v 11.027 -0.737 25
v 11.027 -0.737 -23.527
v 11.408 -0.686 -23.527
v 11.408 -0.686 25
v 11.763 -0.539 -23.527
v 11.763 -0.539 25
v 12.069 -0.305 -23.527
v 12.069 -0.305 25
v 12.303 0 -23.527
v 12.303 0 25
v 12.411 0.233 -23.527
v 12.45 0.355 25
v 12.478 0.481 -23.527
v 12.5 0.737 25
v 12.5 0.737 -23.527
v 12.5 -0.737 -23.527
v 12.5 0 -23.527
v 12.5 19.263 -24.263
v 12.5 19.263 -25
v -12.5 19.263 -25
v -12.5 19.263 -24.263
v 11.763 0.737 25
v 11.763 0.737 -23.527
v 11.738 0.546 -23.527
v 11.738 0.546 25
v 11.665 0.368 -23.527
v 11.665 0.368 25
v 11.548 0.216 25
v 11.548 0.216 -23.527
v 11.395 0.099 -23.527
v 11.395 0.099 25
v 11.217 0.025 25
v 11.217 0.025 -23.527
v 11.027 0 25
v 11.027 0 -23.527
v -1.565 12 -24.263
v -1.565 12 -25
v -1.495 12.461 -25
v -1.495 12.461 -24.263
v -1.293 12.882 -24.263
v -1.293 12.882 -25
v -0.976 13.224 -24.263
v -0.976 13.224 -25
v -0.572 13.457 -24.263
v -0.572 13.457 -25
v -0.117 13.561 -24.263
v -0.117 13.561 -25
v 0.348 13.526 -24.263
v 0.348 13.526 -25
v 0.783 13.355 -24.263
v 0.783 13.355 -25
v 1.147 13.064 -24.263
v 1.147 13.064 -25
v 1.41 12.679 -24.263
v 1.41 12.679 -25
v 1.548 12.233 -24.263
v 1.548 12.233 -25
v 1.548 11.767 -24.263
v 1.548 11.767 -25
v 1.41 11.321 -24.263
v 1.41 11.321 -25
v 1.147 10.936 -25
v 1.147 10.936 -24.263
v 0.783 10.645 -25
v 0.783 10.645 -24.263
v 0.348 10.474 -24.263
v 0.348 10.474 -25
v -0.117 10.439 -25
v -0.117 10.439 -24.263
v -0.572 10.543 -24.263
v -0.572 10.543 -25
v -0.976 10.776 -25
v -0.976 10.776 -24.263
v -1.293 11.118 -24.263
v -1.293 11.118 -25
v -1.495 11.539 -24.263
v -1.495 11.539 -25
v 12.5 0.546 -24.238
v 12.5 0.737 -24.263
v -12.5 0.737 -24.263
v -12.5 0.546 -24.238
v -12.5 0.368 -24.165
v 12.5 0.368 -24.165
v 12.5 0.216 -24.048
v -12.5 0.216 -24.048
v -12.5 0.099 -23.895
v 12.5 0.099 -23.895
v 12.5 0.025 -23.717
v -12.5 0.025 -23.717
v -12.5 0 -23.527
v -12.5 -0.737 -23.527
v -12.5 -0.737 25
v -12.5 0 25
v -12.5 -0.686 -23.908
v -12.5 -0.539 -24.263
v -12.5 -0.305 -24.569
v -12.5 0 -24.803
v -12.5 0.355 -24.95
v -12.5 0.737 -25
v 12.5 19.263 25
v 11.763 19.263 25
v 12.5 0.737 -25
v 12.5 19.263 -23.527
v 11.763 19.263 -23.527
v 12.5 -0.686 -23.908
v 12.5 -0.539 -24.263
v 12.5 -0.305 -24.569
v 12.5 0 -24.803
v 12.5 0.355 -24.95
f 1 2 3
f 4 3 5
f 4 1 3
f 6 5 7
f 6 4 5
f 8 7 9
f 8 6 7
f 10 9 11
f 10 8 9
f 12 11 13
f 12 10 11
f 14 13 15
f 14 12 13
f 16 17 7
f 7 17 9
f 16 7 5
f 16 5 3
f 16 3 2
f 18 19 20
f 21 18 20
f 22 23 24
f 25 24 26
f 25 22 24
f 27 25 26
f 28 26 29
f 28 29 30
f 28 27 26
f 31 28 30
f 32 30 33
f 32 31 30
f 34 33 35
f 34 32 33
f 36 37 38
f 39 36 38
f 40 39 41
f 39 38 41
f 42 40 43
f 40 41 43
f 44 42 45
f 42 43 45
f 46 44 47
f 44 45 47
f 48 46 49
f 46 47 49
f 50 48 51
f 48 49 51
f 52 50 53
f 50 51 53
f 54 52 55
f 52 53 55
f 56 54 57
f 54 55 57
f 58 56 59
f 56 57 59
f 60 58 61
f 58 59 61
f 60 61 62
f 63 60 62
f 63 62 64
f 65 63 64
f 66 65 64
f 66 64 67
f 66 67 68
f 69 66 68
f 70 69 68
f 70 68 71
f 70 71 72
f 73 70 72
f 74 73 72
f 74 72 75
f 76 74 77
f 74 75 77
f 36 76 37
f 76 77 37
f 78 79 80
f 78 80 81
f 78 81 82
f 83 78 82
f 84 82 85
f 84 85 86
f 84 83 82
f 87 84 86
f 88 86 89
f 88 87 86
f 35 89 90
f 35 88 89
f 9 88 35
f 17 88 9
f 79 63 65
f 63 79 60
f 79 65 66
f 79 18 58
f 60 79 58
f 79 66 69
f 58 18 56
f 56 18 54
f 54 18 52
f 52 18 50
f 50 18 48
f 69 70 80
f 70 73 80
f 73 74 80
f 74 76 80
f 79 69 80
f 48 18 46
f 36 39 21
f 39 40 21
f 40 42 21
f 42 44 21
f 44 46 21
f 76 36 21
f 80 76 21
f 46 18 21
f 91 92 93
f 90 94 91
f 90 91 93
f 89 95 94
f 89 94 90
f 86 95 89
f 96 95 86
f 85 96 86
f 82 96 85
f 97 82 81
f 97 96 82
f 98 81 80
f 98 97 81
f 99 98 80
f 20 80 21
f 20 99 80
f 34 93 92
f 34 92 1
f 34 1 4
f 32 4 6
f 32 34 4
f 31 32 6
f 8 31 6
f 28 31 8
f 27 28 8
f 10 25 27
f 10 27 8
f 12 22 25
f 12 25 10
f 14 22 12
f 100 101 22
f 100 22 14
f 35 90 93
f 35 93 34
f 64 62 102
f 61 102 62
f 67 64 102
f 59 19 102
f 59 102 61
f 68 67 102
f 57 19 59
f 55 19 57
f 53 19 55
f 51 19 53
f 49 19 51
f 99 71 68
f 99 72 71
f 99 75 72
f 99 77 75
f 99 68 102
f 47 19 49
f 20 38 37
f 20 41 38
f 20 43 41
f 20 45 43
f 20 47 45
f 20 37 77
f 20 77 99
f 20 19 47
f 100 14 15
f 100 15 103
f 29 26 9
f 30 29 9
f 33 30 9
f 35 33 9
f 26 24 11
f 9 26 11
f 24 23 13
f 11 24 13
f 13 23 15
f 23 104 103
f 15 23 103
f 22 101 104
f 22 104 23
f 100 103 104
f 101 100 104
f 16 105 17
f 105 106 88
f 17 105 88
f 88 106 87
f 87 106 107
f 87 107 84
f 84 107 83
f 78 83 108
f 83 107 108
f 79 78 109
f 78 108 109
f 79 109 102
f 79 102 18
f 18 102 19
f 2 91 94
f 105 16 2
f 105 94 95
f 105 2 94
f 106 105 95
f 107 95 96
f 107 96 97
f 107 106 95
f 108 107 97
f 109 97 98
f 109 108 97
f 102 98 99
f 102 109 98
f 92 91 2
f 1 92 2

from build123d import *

# Parameters (mm, degrees)
SKETCH1_W                    = 25
SKETCH1_H                    = 50
BASE_FLANGE1_DEPTH           = 0.7366
EDGE_FLANGE1_STRIP_W         = 4.4196
EDGE_FLANGE1_STRIP_H         = 0.7366
EDGE_FLANGE1_STRIP_CUT_DEPTH = 25
EDGE_FLANGE1_DEPTH           = 25
EDGE_FLANGE1_PROFILE_W       = 25
EDGE_FLANGE1_PROFILE_H       = 18.5268
EDGE_FLANGE1_PROFILE_R       = 1.565
EDGE_FLANGE1_FLAT_DEPTH      = 0.7366
EDGE_FLANGE3_STRIP_W         = 4.4196
EDGE_FLANGE3_STRIP_H         = 0.7366
EDGE_FLANGE3_STRIP_CUT_DEPTH = 48.5268
EDGE_FLANGE3_DEPTH           = 48.5268


# Sheet-metal steps are written as plain solids
with BuildPart() as part:
    # Sketch1 → Base-Flange1 (new body)
    with BuildSketch(Plane(origin=(0, 0, 0), x_dir=(1, 0, 0), z_dir=(0, 1, 0))):
        Rectangle(SKETCH1_W, SKETCH1_H)
    extrude(amount=-BASE_FLANGE1_DEPTH)

    # Edge-Flange1 strip (across the edge) → Edge-Flange1 strip cut (cut)
    with BuildSketch(Plane(origin=(12.5, 0, -25), x_dir=(0, 0, 1), z_dir=(-1, 0, 0))):
        with Locations((-0.7366, -0.3683)):
            Rectangle(EDGE_FLANGE1_STRIP_W, EDGE_FLANGE1_STRIP_H)
    extrude(amount=EDGE_FLANGE1_STRIP_CUT_DEPTH, mode=Mode.SUBTRACT)

    # Edge-Flange1 bend section (across the edge) → Edge-Flange1 (add)
    with BuildSketch(Plane(origin=(12.5, 0, -25), x_dir=(0, 0, 1), z_dir=(-1, 0, 0))):
        with BuildLine():
            Line((0, 0.7366), (0.7366, 0.7366))
            ThreePointArc((0.7366, 0.7366), (0.952345145, 0.215745145), (1.4732, 0))
            Line((1.4732, 0), (1.4732, -0.7366))
            ThreePointArc((1.4732, -0.7366), (0.43149029, -0.30510971), (0, 0.7366))
        make_face()
    extrude(amount=EDGE_FLANGE1_DEPTH)

    # Edge-Flange1 profile (on flange) → Edge-Flange1 flat (add)
    with BuildSketch(Plane(origin=(0, 0, -25), x_dir=(-1, 0, 0), z_dir=(0, 0, -1))):
        with Locations((0, 10)):
            Rectangle(EDGE_FLANGE1_PROFILE_W, EDGE_FLANGE1_PROFILE_H)
        with Locations((0, 12)):
            Circle(EDGE_FLANGE1_PROFILE_R, mode=Mode.SUBTRACT)
    extrude(amount=-EDGE_FLANGE1_FLAT_DEPTH)

    # Edge-Flange3 strip (across the edge) → Edge-Flange3 strip cut (cut)
    with BuildSketch(Plane(origin=(12.5, 0, 25), x_dir=(-1, 0, 0), z_dir=(0, 0, -1))):
        with Locations((-0.7366, -0.3683)):
            Rectangle(EDGE_FLANGE3_STRIP_W, EDGE_FLANGE3_STRIP_H)
    extrude(amount=EDGE_FLANGE3_STRIP_CUT_DEPTH, mode=Mode.SUBTRACT)

    # Edge-Flange3 section (across the edge) → Edge-Flange3 (add)
    with BuildSketch(Plane(origin=(12.5, 0, 25), x_dir=(-1, 0, 0), z_dir=(0, 0, -1))):
        with BuildLine():
            Line((0, 0.7366), (0, 19.2634))
            Line((0, 19.2634), (0.7366, 19.2634))
            Line((0.7366, 19.2634), (0.7366, 0.7366))
            ThreePointArc((0.7366, 0.7366), (0.952345145, 0.215745145), (1.4732, 0))
            Line((1.4732, 0), (1.4732, -0.7366))
            ThreePointArc((1.4732, -0.7366), (0.43149029, -0.30510971), (0, 0.7366))
        make_face()
    extrude(amount=EDGE_FLANGE3_DEPTH)


solid = part.part
